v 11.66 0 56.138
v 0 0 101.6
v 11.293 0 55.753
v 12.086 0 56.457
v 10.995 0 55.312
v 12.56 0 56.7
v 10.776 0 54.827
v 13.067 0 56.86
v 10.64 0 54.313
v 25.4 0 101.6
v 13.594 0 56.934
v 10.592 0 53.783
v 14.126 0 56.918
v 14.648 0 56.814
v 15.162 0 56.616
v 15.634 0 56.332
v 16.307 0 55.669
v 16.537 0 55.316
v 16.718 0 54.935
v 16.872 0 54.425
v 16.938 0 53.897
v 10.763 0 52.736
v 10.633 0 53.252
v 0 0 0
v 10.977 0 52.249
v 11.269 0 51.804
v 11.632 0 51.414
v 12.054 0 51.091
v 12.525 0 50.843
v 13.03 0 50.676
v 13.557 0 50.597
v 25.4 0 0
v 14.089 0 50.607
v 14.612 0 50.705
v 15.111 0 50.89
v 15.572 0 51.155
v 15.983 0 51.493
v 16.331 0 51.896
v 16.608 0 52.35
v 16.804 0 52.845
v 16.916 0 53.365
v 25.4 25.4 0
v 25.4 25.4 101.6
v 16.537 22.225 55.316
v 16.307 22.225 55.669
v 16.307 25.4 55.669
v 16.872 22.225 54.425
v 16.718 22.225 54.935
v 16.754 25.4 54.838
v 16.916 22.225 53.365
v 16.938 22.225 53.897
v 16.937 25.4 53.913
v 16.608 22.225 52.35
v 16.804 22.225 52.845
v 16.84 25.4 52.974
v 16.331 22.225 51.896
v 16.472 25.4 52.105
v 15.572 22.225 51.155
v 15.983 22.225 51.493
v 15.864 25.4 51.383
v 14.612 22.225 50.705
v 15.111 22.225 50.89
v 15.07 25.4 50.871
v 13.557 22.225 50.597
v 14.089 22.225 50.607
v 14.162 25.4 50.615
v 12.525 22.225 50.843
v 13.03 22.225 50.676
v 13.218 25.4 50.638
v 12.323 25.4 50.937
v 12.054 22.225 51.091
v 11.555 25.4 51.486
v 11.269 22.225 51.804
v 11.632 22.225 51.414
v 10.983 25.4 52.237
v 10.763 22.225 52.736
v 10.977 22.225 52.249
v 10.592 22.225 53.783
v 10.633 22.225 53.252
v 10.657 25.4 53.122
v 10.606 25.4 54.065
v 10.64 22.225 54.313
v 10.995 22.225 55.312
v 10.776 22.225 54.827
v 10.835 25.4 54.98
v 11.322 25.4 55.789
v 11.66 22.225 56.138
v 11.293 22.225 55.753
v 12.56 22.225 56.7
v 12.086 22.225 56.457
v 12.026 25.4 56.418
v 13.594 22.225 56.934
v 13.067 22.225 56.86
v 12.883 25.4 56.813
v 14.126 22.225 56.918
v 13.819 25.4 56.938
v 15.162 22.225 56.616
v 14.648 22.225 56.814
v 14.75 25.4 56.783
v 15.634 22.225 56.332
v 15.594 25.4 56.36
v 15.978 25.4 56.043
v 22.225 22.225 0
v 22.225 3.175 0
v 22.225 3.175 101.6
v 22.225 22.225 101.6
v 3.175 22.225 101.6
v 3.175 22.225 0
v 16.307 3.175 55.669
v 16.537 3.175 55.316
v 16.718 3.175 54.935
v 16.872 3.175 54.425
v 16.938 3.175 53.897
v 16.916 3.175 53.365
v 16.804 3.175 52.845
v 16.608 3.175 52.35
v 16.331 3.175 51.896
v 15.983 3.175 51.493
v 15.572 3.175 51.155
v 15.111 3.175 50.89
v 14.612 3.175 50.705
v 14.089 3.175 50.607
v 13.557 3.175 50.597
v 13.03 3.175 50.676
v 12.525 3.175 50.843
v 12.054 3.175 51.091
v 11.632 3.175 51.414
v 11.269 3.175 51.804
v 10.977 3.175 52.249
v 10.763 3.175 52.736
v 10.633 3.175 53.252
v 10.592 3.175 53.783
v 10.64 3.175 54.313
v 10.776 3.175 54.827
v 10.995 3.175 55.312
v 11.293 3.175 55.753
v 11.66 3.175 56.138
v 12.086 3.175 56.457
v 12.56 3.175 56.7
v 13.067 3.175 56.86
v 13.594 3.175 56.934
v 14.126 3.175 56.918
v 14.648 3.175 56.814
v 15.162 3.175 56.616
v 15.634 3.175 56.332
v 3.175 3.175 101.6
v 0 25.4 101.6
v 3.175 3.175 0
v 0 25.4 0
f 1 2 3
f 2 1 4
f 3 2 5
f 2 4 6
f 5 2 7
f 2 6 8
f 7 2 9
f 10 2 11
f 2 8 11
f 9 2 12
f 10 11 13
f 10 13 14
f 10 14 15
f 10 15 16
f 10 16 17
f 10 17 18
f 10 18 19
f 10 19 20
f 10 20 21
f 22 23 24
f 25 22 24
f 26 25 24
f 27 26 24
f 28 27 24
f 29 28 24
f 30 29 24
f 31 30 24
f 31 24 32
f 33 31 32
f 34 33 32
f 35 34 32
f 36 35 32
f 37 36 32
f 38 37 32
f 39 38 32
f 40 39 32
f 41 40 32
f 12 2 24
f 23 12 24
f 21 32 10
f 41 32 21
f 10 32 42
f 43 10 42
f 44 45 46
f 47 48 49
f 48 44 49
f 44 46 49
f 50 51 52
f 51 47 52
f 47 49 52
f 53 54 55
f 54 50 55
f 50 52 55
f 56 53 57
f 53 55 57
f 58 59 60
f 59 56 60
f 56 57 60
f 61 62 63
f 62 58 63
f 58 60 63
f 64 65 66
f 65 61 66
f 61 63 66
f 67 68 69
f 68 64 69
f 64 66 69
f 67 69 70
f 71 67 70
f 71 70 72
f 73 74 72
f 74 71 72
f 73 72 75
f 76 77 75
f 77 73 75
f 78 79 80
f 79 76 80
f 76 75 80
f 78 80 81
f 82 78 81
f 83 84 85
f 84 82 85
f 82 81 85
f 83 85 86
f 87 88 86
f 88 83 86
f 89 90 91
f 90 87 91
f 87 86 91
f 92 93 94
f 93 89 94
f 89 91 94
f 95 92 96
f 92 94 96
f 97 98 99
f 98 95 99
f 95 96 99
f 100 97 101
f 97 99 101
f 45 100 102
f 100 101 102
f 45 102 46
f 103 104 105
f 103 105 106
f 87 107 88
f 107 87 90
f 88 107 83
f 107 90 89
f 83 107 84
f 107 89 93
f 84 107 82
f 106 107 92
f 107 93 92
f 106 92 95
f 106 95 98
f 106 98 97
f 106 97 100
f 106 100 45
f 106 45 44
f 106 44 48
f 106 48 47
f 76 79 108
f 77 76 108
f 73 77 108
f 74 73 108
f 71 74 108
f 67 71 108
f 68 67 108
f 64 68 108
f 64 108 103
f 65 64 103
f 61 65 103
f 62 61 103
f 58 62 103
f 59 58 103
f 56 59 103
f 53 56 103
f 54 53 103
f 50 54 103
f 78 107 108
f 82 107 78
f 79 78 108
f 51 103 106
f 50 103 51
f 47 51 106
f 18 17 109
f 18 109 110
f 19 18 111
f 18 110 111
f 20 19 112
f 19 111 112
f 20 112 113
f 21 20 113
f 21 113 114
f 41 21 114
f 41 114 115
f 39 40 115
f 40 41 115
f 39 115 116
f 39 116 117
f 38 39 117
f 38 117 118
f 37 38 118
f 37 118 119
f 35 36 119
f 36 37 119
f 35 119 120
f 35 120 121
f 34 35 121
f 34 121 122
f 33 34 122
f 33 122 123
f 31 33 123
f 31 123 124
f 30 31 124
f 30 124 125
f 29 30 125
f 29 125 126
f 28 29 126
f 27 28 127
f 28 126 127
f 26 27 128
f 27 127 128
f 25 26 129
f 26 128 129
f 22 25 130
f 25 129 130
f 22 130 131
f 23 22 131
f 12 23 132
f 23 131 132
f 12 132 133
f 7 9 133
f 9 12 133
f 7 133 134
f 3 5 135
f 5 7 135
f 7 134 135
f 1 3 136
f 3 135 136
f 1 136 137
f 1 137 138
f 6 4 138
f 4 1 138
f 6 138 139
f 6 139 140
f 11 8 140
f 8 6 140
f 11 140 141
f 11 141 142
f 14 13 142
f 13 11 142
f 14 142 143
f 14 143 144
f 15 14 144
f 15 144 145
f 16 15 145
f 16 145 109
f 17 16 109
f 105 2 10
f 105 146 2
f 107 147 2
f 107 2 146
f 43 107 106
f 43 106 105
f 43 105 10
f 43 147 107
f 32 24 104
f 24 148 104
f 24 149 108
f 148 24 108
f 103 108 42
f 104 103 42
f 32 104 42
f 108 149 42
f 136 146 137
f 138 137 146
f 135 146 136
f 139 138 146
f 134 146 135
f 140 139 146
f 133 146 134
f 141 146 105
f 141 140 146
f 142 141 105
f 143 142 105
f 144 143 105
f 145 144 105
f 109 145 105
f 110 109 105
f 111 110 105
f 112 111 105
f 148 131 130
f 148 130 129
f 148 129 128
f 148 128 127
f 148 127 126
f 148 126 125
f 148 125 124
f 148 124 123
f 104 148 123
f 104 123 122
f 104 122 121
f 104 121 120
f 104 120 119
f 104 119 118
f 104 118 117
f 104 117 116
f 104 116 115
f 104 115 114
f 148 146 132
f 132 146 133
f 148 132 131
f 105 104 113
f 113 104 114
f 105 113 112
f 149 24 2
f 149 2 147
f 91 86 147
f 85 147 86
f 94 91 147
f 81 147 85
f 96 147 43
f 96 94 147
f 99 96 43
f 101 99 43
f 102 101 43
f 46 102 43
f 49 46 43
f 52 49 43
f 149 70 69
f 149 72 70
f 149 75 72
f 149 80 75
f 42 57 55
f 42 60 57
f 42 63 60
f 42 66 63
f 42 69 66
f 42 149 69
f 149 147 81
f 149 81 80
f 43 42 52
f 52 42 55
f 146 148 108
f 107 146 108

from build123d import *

# Parameters (mm, degrees)
SKETCH1_W           = 25.4
SKETCH1_H           = 25.4
SKETCH1_W_2         = 19.05
SKETCH1_H_2         = 19.05
BOSS_EXTRUDE1_DEPTH = 101.6
SKETCH2_RX          = 3.175
SKETCH2_RY          = 3.173642052
CUT_EXTRUDE1_DEPTH  = 101.6


with BuildPart() as part:
    # Sketch1 → Boss-Extrude1 (new body)
    with BuildSketch(Plane.XY):
        with Locations((12.7, 12.7)):
            Rectangle(SKETCH1_W, SKETCH1_H)
        with Locations((12.7, 12.7)):
            Rectangle(SKETCH1_W_2, SKETCH1_H_2, mode=Mode.SUBTRACT)
    extrude(amount=BOSS_EXTRUDE1_DEPTH)

    # Sketch2 → Cut-Extrude1 (cut)
    with BuildSketch(Plane(origin=(0, 25.4, 0), x_dir=(1, 0, 0), z_dir=(0, 1, 0))):
        with Locations(Location((13.766367438, -53.764427429), (0, 0, -36.863751169))):
            Ellipse(SKETCH2_RX, SKETCH2_RY)
    extrude(amount=-CUT_EXTRUDE1_DEPTH, mode=Mode.SUBTRACT)


solid = part.part
